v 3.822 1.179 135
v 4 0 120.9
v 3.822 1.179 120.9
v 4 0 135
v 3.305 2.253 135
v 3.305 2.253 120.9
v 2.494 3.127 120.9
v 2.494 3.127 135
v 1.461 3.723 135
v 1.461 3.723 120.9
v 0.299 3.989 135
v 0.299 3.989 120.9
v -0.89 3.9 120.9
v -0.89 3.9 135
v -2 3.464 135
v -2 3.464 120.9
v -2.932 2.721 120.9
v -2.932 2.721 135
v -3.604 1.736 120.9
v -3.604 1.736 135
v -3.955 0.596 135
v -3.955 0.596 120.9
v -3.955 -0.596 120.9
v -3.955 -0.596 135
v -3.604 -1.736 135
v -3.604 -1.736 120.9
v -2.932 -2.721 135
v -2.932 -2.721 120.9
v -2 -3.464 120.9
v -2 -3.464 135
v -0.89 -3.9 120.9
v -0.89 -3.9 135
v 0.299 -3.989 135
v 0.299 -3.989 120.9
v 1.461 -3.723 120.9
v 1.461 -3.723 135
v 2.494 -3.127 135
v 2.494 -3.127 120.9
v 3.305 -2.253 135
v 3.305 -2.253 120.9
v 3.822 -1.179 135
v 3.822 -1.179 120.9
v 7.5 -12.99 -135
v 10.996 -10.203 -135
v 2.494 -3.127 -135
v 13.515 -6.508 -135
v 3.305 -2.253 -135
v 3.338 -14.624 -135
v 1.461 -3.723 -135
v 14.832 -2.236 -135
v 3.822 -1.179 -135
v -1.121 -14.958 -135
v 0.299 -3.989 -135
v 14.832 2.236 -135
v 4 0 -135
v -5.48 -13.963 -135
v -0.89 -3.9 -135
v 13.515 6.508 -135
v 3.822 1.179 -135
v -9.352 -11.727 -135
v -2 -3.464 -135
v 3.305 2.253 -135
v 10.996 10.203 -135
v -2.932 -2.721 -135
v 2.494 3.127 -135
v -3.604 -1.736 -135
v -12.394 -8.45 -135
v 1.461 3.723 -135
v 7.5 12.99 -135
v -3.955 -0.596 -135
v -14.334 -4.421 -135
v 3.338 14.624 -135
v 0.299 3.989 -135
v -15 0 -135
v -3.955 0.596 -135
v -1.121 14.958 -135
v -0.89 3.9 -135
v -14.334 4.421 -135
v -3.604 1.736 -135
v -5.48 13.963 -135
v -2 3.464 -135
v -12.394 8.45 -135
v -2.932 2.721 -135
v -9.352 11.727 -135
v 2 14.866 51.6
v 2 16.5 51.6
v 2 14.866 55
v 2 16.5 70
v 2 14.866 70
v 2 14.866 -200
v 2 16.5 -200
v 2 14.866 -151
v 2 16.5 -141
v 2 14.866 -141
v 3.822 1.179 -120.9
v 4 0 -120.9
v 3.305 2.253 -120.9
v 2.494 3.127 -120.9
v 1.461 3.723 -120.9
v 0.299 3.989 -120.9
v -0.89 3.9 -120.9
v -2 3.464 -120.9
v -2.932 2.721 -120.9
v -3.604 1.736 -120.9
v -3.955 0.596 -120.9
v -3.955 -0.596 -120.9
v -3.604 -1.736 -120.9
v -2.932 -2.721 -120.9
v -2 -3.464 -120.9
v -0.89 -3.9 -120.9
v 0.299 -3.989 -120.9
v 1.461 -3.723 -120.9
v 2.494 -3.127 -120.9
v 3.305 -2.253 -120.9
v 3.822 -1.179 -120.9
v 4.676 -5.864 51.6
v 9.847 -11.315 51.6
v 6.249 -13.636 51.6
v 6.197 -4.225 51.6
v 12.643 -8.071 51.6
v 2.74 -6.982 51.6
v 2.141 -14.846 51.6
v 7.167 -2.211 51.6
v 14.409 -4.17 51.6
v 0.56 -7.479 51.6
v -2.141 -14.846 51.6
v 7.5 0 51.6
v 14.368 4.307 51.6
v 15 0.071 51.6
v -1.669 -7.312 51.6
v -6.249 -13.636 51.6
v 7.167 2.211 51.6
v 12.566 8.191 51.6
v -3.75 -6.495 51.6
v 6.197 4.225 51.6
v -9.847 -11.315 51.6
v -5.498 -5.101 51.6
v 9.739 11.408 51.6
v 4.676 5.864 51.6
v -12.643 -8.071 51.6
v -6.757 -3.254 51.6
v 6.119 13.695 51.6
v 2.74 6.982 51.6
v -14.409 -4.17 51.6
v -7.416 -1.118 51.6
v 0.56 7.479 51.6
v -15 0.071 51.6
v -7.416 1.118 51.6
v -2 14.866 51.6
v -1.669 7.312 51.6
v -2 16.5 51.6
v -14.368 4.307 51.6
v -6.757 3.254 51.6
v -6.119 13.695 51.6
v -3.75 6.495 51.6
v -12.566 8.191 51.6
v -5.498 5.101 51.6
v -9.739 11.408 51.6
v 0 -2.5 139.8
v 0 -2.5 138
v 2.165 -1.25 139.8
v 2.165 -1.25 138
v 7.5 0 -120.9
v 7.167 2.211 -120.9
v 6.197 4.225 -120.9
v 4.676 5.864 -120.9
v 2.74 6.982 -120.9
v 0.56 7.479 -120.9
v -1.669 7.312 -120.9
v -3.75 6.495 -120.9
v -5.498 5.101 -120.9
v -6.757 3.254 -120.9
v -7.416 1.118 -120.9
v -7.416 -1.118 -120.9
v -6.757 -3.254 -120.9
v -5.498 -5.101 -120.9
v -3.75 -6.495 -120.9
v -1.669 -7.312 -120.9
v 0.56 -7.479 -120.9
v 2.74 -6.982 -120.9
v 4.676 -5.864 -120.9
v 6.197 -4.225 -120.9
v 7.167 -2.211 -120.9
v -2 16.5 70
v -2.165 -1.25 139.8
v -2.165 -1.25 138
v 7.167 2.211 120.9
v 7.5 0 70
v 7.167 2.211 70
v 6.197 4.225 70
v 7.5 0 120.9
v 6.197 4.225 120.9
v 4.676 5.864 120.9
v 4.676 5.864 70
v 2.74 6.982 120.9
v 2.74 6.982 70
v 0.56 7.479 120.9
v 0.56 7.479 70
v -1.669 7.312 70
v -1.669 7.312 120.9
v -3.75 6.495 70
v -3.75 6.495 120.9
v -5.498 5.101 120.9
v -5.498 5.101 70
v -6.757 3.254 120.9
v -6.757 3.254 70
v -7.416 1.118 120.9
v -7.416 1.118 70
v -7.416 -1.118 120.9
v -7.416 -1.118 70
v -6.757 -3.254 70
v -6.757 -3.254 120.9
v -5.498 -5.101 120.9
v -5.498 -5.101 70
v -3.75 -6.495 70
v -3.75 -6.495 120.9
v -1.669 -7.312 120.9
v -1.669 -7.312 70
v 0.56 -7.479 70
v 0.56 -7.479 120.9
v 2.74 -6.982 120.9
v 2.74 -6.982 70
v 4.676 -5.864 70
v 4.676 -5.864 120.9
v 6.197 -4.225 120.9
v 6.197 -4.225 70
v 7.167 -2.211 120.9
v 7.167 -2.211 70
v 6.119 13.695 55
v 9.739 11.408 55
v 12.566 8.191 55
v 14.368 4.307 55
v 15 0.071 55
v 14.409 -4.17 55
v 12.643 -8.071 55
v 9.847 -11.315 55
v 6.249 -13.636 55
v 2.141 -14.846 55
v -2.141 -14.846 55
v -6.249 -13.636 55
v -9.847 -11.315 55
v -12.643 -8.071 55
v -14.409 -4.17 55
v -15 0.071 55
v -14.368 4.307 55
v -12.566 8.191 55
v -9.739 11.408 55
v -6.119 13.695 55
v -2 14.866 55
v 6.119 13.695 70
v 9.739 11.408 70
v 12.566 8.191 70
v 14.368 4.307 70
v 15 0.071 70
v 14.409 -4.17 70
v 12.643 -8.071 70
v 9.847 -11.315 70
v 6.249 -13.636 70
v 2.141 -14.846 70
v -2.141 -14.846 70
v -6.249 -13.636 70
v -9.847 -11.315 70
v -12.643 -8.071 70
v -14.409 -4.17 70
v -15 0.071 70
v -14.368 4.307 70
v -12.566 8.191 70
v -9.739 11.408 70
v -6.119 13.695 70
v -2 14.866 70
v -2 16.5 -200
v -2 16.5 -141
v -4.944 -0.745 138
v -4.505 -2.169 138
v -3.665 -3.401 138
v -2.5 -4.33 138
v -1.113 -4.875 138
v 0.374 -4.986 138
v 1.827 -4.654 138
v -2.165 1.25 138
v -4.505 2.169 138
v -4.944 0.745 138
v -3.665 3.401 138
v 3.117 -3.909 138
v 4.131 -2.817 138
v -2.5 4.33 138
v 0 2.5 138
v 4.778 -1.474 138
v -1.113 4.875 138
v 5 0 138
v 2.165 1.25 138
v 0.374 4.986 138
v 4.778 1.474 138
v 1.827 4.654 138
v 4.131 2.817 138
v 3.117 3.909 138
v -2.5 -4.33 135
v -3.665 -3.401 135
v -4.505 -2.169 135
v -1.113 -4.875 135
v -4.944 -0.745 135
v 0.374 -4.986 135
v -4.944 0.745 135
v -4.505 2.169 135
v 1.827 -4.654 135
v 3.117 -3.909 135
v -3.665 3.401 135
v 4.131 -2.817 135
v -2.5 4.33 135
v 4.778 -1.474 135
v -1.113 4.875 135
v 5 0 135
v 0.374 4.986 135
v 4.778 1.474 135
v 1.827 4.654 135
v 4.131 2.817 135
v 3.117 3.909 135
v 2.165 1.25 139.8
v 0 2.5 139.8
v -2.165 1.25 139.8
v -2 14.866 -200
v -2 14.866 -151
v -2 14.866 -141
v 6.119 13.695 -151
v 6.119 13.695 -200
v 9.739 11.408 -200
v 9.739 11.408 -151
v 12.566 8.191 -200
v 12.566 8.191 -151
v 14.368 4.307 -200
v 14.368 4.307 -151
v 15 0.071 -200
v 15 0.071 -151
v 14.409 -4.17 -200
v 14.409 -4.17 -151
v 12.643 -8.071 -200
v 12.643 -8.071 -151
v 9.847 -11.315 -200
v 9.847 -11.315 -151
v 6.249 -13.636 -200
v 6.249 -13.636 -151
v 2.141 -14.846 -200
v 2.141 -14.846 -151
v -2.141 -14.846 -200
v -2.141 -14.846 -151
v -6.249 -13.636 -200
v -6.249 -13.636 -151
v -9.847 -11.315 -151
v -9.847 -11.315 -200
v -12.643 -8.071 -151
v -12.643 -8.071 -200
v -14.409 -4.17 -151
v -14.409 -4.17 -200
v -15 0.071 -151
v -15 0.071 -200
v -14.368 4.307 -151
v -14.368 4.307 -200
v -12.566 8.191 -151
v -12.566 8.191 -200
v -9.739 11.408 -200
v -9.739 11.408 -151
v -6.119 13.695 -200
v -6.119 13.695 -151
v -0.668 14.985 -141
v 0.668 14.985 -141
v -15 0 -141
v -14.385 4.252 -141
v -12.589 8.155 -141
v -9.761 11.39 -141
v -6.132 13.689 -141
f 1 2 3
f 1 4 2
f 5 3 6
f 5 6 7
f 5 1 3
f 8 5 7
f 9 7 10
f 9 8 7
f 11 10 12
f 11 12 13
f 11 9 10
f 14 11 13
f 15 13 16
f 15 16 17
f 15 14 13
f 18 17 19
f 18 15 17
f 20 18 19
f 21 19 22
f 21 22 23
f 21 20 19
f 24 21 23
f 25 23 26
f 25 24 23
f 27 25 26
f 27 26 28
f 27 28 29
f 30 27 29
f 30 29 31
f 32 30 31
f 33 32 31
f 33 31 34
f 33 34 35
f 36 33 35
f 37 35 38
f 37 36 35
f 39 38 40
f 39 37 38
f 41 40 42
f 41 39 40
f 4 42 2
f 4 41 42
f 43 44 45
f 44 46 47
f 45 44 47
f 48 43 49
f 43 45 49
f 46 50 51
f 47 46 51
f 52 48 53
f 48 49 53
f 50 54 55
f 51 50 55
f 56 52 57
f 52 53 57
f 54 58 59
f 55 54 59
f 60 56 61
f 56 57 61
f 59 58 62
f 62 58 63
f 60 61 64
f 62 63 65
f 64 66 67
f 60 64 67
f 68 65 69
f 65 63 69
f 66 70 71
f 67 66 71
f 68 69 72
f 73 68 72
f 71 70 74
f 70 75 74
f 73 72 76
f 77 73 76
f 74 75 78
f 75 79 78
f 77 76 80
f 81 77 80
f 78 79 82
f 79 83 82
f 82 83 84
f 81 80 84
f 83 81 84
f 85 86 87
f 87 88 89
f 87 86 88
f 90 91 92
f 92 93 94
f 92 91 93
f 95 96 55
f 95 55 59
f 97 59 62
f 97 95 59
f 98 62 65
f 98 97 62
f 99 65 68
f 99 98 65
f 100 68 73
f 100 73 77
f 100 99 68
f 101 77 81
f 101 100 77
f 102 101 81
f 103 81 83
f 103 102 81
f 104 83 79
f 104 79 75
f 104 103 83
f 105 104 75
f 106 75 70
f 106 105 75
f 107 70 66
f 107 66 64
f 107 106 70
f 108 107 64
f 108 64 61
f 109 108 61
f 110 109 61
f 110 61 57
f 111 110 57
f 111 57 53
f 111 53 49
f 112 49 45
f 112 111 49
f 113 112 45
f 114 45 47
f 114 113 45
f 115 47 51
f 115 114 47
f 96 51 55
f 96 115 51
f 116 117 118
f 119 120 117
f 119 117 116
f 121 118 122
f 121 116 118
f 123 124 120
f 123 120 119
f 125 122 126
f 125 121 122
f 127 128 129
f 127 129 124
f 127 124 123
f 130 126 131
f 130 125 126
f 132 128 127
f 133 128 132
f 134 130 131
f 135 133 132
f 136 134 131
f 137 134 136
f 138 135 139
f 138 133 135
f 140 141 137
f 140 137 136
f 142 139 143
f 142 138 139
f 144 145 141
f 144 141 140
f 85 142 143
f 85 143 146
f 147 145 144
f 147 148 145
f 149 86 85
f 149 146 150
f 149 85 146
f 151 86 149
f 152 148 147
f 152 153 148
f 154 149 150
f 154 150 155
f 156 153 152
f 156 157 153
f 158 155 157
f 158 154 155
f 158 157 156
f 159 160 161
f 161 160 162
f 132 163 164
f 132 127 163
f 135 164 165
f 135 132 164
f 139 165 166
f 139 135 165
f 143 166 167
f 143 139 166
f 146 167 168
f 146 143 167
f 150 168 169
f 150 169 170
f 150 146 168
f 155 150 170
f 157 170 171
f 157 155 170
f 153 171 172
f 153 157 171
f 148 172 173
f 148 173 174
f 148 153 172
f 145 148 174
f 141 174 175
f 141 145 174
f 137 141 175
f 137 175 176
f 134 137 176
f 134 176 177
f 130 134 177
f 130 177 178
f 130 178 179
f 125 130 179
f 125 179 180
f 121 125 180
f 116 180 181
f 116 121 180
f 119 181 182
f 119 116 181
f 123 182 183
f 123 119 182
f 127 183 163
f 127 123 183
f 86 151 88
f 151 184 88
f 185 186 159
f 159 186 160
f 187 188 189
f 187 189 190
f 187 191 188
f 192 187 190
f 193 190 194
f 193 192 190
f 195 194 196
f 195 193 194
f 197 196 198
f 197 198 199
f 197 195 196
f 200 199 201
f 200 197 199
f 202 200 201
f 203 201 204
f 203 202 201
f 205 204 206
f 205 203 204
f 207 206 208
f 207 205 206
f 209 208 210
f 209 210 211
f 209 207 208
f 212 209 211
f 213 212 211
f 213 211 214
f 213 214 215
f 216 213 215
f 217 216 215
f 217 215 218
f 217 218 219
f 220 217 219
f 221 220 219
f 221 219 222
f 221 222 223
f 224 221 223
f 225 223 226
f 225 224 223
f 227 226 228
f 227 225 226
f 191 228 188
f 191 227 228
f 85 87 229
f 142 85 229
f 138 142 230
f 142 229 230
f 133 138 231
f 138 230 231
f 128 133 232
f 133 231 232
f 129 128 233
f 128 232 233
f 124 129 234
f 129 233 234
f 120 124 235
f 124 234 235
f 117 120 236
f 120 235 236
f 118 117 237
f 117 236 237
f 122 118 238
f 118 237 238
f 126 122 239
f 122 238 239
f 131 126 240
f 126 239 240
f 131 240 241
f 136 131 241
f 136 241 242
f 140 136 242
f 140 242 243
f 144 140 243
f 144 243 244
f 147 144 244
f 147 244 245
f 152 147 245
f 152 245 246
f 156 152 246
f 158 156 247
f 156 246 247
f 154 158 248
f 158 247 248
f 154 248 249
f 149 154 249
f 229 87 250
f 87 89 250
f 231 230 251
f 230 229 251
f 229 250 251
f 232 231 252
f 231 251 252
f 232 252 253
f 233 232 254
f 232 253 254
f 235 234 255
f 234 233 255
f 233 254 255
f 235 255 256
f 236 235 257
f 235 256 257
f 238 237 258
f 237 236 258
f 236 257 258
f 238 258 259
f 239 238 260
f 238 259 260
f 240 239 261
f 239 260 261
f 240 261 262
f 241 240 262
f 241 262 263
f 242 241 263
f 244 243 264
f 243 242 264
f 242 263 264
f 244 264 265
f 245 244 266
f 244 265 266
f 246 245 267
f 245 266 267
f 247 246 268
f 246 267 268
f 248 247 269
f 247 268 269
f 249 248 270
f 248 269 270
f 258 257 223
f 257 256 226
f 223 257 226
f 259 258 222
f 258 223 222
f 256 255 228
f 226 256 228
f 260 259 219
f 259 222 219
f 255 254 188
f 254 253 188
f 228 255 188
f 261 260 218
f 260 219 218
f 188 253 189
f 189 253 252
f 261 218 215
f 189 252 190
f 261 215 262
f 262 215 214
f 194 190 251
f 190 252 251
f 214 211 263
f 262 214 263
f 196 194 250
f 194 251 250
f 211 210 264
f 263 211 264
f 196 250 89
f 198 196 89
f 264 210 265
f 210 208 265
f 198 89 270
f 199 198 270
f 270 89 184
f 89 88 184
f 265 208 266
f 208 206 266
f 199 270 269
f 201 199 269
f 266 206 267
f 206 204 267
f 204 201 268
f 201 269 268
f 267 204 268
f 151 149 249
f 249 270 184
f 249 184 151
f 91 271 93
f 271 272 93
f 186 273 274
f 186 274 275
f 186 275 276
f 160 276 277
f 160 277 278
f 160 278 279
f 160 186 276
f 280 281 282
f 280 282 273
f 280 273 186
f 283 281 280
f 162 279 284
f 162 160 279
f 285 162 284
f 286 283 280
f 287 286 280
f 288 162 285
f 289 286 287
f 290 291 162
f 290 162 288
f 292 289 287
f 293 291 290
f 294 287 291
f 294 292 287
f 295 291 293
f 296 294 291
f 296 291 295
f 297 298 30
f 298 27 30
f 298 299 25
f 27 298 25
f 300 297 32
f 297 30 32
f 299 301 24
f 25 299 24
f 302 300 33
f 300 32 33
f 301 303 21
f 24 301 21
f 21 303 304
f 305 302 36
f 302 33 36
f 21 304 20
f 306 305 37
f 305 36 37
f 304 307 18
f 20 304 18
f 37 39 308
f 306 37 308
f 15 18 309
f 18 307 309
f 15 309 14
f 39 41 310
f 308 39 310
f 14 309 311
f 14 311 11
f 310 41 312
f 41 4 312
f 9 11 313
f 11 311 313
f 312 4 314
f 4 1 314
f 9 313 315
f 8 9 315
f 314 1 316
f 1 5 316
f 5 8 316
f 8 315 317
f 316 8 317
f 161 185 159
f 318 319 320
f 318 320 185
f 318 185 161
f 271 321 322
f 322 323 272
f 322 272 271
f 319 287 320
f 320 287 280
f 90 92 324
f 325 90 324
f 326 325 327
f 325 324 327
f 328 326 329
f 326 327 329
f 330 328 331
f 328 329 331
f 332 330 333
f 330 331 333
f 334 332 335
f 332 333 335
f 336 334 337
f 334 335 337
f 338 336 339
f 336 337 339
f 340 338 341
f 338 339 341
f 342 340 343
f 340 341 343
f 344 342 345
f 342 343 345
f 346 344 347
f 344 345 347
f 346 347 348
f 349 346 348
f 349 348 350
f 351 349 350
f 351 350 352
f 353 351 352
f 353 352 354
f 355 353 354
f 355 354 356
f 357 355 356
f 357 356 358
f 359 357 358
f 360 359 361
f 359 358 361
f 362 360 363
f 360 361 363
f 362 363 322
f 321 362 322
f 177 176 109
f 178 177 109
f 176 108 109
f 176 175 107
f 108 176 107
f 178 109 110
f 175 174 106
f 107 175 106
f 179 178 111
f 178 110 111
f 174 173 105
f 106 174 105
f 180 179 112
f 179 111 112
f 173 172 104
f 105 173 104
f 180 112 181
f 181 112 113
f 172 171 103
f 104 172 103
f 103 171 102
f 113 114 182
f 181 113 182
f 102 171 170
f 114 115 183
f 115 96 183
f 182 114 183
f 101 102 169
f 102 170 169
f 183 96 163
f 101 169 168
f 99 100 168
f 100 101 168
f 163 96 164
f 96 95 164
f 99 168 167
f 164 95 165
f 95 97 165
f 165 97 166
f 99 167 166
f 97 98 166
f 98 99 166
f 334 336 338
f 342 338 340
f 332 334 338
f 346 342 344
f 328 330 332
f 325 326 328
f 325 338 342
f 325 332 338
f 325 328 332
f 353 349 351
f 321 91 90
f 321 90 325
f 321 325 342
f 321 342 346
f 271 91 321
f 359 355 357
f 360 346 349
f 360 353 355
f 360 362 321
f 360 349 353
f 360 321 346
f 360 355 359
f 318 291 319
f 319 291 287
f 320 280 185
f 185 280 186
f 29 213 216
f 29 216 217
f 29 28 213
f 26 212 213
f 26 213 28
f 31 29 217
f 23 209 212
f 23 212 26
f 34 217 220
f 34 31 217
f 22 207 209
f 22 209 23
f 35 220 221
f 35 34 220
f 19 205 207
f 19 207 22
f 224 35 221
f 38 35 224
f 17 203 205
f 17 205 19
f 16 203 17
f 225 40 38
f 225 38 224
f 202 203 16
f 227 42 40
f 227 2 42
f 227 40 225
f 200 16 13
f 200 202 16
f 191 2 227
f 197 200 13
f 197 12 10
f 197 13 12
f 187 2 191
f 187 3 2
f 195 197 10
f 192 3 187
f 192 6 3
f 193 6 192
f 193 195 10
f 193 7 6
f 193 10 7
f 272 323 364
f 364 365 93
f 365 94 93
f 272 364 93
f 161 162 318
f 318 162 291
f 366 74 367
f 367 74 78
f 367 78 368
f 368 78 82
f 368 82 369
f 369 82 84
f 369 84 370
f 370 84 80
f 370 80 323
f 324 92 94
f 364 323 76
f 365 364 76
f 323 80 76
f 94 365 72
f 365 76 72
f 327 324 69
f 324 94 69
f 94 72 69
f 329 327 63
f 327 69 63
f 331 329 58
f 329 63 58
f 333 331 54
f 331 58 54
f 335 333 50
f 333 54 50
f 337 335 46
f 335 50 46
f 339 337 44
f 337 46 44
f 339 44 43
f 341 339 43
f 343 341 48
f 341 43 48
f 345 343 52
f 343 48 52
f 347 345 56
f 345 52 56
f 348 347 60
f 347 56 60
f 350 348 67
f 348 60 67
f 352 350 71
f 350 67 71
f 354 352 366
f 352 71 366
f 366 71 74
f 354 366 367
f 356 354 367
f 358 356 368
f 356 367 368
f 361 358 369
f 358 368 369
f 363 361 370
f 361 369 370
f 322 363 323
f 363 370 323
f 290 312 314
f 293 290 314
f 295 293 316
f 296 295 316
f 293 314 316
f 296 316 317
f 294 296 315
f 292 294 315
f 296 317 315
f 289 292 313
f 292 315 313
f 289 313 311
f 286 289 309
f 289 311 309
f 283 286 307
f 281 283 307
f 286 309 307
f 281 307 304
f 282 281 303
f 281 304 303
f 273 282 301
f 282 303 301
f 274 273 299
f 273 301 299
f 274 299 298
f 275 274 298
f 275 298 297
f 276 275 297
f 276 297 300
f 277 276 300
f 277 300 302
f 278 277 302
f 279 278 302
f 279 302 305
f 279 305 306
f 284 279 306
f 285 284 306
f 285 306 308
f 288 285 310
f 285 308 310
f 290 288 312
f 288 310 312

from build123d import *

# Parameters (mm, degrees)
CROQUIS1_R               = 4
SALIENTE_EXTRUIR1_DEPTH  = 135
CROQUIS2_R               = 5
SALIENTE_EXTRUIR2_DEPTH  = 3
SALIENTE_EXTRUIR3_DEPTH  = 1.8
CROQUIS4_R               = 7.5
SALIENTE_EXTRUIR4_DEPTH  = 120.9
CROQUIS5_R               = 15
SALIENTE_EXTRUIR5_DEPTH  = 15
CROQUIS7_W               = 4
CROQUIS7_H               = 3
SALIENTE_EXTRUIR6_DEPTH  = 15
SALIENTE_EXTRUIR7_DEPTH  = 3.4
CROQUIS9_R               = 15
SALIENTE_EXTRUIR8_DEPTH  = 6
CROQUIS10_R              = 15
SALIENTE_EXTRUIR9_DEPTH  = 10
SALIENTE_EXTRUIR10_DEPTH = 49


with BuildPart() as part:
    # Croquis1 → Saliente-Extruir1 (new, symmetric)
    with BuildSketch(Plane.XY):
        Circle(CROQUIS1_R)
    extrude(amount=SALIENTE_EXTRUIR1_DEPTH, both=True)

    # Croquis2 → Saliente-Extruir2 (add)
    with BuildSketch(Plane.XY.offset(135)):
        Circle(CROQUIS2_R)
    extrude(amount=SALIENTE_EXTRUIR2_DEPTH)

    # Croquis3 → Saliente-Extruir3 (add)
    with BuildSketch(Plane.XY.offset(138)):
        Polygon((0, 2.5), (-2.165063509, 1.25), (-2.165063509, -1.25), (0, -2.5), (2.165063509, -1.25), (2.165063509, 1.25), align=None)
    extrude(amount=SALIENTE_EXTRUIR3_DEPTH)

    # Croquis4 → Saliente-Extruir4 (add, symmetric)
    with BuildSketch(Plane.XY):
        Circle(CROQUIS4_R)
    extrude(amount=SALIENTE_EXTRUIR4_DEPTH, both=True)

    # Croquis5 → Saliente-Extruir5 (add)
    with BuildSketch(Plane(origin=(0, 0, 70), x_dir=(-1, 0, 0), z_dir=(0, 0, -1))):
        Circle(CROQUIS5_R)
    extrude(amount=SALIENTE_EXTRUIR5_DEPTH)

    # Croquis7 → Saliente-Extruir6 (add)
    with BuildSketch(Plane.XY.offset(70)):
        with Locations((0, 15)):
            Rectangle(CROQUIS7_W, CROQUIS7_H)
    extrude(amount=-SALIENTE_EXTRUIR6_DEPTH)

    # Croquis8 → Saliente-Extruir7 (add)
    with BuildSketch(Plane(origin=(0, 0, 55), x_dir=(-1, 0, 0), z_dir=(0, 0, -1))):
        with BuildLine():
            Line((2, 14.866068747), (2, 16.5))
            Line((2, 16.5), (-2, 16.5))
            Line((-2, 16.5), (-2, 14.866068747))
            ThreePointArc((-2, 14.866068747), (0, -15), (2, 14.866068747))
        make_face()
    extrude(amount=SALIENTE_EXTRUIR7_DEPTH)

    # Croquis9 → Saliente-Extruir8 (add)
    with BuildSketch(Plane(origin=(0, 0, -135), x_dir=(-1, 0, 0), z_dir=(0, 0, -1))):
        Circle(CROQUIS9_R)
    extrude(amount=SALIENTE_EXTRUIR8_DEPTH)

    # Croquis10 → Saliente-Extruir9 (add)
    with BuildSketch(Plane(origin=(0, 0, -141), x_dir=(-1, 0, 0), z_dir=(0, 0, -1))):
        with Locations(Location((0, 0, 0), (0, 0, 97.662255661))):
            Circle(CROQUIS10_R)
        with BuildLine():
            Line((-2, 16.5), (-2, 14.866068747))
            ThreePointArc((-2, 14.866068747), (0, 15), (2, 14.866068747))
            Line((2, 14.866068747), (2, 16.5))
            Line((2, 16.5), (-2, 16.5))
        make_face()
    extrude(amount=SALIENTE_EXTRUIR9_DEPTH)

    # Croquis11 → Saliente-Extruir10 (add)
    with BuildSketch(Plane(origin=(0, 0, -151), x_dir=(-1, 0, 0), z_dir=(0, 0, -1))):
        with BuildLine():
            Line((2, 14.866068747), (2, 16.5))
            Line((2, 16.5), (-2, 16.5))
            Line((-2, 16.5), (-2, 14.866068747))
            ThreePointArc((-2, 14.866068747), (0, -15), (2, 14.866068747))
        make_face()
    extrude(amount=SALIENTE_EXTRUIR10_DEPTH)


solid = part.part
